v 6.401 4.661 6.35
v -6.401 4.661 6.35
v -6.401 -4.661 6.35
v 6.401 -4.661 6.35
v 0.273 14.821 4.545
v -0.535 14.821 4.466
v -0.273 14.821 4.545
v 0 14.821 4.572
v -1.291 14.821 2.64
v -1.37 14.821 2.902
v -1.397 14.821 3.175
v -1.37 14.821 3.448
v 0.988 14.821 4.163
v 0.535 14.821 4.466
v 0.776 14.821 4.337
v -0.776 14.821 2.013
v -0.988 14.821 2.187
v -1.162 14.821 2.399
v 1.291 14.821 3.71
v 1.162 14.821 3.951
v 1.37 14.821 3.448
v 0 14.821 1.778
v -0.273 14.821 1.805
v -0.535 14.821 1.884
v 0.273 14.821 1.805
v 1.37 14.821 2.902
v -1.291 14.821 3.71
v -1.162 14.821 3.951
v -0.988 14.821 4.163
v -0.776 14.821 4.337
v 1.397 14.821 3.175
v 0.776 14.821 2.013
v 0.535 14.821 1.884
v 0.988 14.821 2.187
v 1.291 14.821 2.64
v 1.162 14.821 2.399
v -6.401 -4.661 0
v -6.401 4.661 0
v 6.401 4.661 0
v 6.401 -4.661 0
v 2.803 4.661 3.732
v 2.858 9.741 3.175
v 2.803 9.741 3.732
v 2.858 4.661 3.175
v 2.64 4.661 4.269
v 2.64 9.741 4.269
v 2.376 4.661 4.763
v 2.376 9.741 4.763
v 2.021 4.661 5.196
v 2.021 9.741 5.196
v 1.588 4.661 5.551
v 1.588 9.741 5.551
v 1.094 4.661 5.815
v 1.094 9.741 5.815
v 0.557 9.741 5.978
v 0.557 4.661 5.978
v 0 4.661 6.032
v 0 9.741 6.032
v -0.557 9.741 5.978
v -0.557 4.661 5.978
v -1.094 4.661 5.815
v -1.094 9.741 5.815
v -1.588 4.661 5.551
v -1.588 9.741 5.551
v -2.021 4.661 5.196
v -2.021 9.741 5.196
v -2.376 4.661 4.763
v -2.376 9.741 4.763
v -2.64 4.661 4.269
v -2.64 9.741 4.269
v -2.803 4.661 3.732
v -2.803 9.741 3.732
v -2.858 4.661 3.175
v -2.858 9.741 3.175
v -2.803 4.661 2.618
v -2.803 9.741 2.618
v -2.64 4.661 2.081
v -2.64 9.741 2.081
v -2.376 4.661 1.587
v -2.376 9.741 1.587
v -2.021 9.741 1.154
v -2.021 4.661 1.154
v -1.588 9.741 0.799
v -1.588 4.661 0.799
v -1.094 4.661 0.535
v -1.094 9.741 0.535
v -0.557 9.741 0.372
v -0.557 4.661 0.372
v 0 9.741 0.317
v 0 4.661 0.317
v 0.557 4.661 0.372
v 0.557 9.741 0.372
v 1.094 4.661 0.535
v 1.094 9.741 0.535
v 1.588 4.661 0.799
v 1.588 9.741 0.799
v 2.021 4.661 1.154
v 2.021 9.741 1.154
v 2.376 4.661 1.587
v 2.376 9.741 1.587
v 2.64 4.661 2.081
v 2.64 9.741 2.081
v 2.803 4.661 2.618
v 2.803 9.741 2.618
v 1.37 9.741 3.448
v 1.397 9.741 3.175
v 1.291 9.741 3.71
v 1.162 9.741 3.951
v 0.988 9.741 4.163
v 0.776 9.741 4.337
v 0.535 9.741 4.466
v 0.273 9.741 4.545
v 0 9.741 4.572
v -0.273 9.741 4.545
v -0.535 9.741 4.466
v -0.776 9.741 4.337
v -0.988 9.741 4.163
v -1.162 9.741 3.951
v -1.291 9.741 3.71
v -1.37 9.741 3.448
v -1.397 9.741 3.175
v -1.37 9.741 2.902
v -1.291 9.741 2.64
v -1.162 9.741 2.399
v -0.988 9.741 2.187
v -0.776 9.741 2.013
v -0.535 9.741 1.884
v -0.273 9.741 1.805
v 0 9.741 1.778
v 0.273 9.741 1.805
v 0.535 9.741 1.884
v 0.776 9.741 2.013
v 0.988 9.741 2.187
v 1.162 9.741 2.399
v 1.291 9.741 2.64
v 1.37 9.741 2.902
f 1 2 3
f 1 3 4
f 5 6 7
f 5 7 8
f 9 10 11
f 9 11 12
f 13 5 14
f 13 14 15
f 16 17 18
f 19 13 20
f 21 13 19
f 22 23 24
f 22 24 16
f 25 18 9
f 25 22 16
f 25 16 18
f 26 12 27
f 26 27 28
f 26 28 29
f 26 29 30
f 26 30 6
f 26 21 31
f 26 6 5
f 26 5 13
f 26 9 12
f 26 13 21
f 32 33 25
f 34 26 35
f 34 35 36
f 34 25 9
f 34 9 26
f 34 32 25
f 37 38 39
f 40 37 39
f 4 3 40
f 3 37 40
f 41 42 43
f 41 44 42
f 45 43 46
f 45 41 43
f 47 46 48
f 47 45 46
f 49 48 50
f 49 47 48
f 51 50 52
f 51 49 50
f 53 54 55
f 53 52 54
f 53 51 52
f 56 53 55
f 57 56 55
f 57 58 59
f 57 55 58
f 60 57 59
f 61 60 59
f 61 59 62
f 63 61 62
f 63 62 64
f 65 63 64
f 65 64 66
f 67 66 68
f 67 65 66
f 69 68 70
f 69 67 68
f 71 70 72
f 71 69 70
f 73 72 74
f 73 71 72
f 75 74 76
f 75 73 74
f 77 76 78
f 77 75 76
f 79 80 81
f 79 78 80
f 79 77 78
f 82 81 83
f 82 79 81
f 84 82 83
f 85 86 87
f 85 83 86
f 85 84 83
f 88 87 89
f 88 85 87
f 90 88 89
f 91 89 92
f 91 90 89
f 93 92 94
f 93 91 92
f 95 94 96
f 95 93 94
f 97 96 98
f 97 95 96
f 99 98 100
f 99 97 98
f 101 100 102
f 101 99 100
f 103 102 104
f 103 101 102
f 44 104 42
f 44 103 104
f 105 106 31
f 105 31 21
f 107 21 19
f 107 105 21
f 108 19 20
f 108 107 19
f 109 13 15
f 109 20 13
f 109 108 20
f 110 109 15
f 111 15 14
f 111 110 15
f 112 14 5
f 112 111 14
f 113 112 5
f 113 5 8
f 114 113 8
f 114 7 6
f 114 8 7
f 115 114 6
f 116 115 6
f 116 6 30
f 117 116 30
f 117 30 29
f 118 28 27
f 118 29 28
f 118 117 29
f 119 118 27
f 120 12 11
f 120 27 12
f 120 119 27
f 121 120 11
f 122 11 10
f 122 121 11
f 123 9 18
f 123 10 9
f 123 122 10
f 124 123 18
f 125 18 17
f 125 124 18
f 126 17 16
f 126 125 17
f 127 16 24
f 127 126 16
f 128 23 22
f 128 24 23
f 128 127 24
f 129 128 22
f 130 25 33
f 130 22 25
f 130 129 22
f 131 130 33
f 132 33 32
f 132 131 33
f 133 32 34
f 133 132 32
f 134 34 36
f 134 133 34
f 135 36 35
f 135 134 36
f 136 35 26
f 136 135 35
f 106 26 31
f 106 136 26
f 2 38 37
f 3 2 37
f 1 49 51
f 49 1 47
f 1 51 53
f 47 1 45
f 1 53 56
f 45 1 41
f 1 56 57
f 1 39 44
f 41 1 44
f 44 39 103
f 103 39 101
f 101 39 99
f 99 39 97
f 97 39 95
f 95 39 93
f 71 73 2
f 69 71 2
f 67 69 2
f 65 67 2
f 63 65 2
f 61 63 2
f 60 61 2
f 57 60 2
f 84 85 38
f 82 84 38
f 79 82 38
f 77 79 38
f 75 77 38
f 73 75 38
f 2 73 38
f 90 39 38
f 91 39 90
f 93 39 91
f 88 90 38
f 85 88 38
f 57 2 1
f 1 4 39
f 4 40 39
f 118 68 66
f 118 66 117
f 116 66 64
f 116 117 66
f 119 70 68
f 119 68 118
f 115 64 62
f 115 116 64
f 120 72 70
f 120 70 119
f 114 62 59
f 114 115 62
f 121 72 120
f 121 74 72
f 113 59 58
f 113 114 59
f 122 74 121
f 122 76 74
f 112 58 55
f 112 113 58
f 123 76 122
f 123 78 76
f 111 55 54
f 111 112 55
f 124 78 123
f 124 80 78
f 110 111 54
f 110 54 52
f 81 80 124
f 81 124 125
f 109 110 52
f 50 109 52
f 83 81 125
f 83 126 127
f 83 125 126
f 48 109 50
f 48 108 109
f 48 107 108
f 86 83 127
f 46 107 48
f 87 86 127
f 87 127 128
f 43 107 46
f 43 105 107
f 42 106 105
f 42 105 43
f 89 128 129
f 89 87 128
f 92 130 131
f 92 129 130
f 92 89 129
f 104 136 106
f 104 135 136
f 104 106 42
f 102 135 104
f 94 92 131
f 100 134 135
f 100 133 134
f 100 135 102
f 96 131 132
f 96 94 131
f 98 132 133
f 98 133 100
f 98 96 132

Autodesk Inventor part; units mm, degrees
ref_plane "YZ Plane" through (0, 0, 0) normal (1, 0, 0) x (0, 1, 0)
ref_plane "XZ Plane" through (0, 0, 0) normal (0, 1, 0) x (-1, 0, 0)
ref_plane "XY Plane" through (0, 0, 0) normal (0, 0, 1) x (1, 0, 0)
sketch "Sketch1" plane through (0, 0, 0) normal (0, 0, 1) x (1, 0, 0)
  line L0 (-6.4008, -4.6609) -> (6.4008, -4.6609)
  line L1 (6.4008, -4.6609) -> (6.4008, 4.6609)
  line L2 (6.4008, 4.6609) -> (-6.4008, 4.6609)
  line L3 (-6.4008, 4.6609) -> (-6.4008, -4.6609)
  line L4 (-6.4008, -4.6609) -> (6.4008, 4.6609) construction
  line L5 (6.4008, -4.6609) -> (-6.4008, 4.6609) construction
  point P0 (0, 0)
  dimension "d0" = 12.8016
  dimension "d1" = 9.3218
extrude "Extrusion1" add sketch "Sketch1" along normal blind 6.35
sketch "Sketch2" plane through (-6.4008, 4.6609, 0) normal (0, 1, 0) x (1, 0, 0)
  line L0 (0, 0) -> (0, -6.35) projected
  line L1 (12.8016, 0) -> (12.8016, -6.35) projected
  line L2 (0, -6.35) -> (12.8016, -6.35) projected
  circle A0 centre (6.4008, -3.175) radius 2.8575
  point P0 (6.4008, 0)
  dimension "d4" = 5.715
extrude "Extrusion2" add sketch "Sketch2" along normal blind 5.08
sketch "Sketch3" plane through (0, 9.7409, 3.175) normal (0, 1, 0) x (1, 0, 0)
  circle A0 centre (0, 0) radius 1.397
  point P0 (0, 3.175)
  dimension "d7" = 2.794
extrude "Extrusion3" add sketch "Sketch3" along normal blind 5.08
properties part number "switch jp"
